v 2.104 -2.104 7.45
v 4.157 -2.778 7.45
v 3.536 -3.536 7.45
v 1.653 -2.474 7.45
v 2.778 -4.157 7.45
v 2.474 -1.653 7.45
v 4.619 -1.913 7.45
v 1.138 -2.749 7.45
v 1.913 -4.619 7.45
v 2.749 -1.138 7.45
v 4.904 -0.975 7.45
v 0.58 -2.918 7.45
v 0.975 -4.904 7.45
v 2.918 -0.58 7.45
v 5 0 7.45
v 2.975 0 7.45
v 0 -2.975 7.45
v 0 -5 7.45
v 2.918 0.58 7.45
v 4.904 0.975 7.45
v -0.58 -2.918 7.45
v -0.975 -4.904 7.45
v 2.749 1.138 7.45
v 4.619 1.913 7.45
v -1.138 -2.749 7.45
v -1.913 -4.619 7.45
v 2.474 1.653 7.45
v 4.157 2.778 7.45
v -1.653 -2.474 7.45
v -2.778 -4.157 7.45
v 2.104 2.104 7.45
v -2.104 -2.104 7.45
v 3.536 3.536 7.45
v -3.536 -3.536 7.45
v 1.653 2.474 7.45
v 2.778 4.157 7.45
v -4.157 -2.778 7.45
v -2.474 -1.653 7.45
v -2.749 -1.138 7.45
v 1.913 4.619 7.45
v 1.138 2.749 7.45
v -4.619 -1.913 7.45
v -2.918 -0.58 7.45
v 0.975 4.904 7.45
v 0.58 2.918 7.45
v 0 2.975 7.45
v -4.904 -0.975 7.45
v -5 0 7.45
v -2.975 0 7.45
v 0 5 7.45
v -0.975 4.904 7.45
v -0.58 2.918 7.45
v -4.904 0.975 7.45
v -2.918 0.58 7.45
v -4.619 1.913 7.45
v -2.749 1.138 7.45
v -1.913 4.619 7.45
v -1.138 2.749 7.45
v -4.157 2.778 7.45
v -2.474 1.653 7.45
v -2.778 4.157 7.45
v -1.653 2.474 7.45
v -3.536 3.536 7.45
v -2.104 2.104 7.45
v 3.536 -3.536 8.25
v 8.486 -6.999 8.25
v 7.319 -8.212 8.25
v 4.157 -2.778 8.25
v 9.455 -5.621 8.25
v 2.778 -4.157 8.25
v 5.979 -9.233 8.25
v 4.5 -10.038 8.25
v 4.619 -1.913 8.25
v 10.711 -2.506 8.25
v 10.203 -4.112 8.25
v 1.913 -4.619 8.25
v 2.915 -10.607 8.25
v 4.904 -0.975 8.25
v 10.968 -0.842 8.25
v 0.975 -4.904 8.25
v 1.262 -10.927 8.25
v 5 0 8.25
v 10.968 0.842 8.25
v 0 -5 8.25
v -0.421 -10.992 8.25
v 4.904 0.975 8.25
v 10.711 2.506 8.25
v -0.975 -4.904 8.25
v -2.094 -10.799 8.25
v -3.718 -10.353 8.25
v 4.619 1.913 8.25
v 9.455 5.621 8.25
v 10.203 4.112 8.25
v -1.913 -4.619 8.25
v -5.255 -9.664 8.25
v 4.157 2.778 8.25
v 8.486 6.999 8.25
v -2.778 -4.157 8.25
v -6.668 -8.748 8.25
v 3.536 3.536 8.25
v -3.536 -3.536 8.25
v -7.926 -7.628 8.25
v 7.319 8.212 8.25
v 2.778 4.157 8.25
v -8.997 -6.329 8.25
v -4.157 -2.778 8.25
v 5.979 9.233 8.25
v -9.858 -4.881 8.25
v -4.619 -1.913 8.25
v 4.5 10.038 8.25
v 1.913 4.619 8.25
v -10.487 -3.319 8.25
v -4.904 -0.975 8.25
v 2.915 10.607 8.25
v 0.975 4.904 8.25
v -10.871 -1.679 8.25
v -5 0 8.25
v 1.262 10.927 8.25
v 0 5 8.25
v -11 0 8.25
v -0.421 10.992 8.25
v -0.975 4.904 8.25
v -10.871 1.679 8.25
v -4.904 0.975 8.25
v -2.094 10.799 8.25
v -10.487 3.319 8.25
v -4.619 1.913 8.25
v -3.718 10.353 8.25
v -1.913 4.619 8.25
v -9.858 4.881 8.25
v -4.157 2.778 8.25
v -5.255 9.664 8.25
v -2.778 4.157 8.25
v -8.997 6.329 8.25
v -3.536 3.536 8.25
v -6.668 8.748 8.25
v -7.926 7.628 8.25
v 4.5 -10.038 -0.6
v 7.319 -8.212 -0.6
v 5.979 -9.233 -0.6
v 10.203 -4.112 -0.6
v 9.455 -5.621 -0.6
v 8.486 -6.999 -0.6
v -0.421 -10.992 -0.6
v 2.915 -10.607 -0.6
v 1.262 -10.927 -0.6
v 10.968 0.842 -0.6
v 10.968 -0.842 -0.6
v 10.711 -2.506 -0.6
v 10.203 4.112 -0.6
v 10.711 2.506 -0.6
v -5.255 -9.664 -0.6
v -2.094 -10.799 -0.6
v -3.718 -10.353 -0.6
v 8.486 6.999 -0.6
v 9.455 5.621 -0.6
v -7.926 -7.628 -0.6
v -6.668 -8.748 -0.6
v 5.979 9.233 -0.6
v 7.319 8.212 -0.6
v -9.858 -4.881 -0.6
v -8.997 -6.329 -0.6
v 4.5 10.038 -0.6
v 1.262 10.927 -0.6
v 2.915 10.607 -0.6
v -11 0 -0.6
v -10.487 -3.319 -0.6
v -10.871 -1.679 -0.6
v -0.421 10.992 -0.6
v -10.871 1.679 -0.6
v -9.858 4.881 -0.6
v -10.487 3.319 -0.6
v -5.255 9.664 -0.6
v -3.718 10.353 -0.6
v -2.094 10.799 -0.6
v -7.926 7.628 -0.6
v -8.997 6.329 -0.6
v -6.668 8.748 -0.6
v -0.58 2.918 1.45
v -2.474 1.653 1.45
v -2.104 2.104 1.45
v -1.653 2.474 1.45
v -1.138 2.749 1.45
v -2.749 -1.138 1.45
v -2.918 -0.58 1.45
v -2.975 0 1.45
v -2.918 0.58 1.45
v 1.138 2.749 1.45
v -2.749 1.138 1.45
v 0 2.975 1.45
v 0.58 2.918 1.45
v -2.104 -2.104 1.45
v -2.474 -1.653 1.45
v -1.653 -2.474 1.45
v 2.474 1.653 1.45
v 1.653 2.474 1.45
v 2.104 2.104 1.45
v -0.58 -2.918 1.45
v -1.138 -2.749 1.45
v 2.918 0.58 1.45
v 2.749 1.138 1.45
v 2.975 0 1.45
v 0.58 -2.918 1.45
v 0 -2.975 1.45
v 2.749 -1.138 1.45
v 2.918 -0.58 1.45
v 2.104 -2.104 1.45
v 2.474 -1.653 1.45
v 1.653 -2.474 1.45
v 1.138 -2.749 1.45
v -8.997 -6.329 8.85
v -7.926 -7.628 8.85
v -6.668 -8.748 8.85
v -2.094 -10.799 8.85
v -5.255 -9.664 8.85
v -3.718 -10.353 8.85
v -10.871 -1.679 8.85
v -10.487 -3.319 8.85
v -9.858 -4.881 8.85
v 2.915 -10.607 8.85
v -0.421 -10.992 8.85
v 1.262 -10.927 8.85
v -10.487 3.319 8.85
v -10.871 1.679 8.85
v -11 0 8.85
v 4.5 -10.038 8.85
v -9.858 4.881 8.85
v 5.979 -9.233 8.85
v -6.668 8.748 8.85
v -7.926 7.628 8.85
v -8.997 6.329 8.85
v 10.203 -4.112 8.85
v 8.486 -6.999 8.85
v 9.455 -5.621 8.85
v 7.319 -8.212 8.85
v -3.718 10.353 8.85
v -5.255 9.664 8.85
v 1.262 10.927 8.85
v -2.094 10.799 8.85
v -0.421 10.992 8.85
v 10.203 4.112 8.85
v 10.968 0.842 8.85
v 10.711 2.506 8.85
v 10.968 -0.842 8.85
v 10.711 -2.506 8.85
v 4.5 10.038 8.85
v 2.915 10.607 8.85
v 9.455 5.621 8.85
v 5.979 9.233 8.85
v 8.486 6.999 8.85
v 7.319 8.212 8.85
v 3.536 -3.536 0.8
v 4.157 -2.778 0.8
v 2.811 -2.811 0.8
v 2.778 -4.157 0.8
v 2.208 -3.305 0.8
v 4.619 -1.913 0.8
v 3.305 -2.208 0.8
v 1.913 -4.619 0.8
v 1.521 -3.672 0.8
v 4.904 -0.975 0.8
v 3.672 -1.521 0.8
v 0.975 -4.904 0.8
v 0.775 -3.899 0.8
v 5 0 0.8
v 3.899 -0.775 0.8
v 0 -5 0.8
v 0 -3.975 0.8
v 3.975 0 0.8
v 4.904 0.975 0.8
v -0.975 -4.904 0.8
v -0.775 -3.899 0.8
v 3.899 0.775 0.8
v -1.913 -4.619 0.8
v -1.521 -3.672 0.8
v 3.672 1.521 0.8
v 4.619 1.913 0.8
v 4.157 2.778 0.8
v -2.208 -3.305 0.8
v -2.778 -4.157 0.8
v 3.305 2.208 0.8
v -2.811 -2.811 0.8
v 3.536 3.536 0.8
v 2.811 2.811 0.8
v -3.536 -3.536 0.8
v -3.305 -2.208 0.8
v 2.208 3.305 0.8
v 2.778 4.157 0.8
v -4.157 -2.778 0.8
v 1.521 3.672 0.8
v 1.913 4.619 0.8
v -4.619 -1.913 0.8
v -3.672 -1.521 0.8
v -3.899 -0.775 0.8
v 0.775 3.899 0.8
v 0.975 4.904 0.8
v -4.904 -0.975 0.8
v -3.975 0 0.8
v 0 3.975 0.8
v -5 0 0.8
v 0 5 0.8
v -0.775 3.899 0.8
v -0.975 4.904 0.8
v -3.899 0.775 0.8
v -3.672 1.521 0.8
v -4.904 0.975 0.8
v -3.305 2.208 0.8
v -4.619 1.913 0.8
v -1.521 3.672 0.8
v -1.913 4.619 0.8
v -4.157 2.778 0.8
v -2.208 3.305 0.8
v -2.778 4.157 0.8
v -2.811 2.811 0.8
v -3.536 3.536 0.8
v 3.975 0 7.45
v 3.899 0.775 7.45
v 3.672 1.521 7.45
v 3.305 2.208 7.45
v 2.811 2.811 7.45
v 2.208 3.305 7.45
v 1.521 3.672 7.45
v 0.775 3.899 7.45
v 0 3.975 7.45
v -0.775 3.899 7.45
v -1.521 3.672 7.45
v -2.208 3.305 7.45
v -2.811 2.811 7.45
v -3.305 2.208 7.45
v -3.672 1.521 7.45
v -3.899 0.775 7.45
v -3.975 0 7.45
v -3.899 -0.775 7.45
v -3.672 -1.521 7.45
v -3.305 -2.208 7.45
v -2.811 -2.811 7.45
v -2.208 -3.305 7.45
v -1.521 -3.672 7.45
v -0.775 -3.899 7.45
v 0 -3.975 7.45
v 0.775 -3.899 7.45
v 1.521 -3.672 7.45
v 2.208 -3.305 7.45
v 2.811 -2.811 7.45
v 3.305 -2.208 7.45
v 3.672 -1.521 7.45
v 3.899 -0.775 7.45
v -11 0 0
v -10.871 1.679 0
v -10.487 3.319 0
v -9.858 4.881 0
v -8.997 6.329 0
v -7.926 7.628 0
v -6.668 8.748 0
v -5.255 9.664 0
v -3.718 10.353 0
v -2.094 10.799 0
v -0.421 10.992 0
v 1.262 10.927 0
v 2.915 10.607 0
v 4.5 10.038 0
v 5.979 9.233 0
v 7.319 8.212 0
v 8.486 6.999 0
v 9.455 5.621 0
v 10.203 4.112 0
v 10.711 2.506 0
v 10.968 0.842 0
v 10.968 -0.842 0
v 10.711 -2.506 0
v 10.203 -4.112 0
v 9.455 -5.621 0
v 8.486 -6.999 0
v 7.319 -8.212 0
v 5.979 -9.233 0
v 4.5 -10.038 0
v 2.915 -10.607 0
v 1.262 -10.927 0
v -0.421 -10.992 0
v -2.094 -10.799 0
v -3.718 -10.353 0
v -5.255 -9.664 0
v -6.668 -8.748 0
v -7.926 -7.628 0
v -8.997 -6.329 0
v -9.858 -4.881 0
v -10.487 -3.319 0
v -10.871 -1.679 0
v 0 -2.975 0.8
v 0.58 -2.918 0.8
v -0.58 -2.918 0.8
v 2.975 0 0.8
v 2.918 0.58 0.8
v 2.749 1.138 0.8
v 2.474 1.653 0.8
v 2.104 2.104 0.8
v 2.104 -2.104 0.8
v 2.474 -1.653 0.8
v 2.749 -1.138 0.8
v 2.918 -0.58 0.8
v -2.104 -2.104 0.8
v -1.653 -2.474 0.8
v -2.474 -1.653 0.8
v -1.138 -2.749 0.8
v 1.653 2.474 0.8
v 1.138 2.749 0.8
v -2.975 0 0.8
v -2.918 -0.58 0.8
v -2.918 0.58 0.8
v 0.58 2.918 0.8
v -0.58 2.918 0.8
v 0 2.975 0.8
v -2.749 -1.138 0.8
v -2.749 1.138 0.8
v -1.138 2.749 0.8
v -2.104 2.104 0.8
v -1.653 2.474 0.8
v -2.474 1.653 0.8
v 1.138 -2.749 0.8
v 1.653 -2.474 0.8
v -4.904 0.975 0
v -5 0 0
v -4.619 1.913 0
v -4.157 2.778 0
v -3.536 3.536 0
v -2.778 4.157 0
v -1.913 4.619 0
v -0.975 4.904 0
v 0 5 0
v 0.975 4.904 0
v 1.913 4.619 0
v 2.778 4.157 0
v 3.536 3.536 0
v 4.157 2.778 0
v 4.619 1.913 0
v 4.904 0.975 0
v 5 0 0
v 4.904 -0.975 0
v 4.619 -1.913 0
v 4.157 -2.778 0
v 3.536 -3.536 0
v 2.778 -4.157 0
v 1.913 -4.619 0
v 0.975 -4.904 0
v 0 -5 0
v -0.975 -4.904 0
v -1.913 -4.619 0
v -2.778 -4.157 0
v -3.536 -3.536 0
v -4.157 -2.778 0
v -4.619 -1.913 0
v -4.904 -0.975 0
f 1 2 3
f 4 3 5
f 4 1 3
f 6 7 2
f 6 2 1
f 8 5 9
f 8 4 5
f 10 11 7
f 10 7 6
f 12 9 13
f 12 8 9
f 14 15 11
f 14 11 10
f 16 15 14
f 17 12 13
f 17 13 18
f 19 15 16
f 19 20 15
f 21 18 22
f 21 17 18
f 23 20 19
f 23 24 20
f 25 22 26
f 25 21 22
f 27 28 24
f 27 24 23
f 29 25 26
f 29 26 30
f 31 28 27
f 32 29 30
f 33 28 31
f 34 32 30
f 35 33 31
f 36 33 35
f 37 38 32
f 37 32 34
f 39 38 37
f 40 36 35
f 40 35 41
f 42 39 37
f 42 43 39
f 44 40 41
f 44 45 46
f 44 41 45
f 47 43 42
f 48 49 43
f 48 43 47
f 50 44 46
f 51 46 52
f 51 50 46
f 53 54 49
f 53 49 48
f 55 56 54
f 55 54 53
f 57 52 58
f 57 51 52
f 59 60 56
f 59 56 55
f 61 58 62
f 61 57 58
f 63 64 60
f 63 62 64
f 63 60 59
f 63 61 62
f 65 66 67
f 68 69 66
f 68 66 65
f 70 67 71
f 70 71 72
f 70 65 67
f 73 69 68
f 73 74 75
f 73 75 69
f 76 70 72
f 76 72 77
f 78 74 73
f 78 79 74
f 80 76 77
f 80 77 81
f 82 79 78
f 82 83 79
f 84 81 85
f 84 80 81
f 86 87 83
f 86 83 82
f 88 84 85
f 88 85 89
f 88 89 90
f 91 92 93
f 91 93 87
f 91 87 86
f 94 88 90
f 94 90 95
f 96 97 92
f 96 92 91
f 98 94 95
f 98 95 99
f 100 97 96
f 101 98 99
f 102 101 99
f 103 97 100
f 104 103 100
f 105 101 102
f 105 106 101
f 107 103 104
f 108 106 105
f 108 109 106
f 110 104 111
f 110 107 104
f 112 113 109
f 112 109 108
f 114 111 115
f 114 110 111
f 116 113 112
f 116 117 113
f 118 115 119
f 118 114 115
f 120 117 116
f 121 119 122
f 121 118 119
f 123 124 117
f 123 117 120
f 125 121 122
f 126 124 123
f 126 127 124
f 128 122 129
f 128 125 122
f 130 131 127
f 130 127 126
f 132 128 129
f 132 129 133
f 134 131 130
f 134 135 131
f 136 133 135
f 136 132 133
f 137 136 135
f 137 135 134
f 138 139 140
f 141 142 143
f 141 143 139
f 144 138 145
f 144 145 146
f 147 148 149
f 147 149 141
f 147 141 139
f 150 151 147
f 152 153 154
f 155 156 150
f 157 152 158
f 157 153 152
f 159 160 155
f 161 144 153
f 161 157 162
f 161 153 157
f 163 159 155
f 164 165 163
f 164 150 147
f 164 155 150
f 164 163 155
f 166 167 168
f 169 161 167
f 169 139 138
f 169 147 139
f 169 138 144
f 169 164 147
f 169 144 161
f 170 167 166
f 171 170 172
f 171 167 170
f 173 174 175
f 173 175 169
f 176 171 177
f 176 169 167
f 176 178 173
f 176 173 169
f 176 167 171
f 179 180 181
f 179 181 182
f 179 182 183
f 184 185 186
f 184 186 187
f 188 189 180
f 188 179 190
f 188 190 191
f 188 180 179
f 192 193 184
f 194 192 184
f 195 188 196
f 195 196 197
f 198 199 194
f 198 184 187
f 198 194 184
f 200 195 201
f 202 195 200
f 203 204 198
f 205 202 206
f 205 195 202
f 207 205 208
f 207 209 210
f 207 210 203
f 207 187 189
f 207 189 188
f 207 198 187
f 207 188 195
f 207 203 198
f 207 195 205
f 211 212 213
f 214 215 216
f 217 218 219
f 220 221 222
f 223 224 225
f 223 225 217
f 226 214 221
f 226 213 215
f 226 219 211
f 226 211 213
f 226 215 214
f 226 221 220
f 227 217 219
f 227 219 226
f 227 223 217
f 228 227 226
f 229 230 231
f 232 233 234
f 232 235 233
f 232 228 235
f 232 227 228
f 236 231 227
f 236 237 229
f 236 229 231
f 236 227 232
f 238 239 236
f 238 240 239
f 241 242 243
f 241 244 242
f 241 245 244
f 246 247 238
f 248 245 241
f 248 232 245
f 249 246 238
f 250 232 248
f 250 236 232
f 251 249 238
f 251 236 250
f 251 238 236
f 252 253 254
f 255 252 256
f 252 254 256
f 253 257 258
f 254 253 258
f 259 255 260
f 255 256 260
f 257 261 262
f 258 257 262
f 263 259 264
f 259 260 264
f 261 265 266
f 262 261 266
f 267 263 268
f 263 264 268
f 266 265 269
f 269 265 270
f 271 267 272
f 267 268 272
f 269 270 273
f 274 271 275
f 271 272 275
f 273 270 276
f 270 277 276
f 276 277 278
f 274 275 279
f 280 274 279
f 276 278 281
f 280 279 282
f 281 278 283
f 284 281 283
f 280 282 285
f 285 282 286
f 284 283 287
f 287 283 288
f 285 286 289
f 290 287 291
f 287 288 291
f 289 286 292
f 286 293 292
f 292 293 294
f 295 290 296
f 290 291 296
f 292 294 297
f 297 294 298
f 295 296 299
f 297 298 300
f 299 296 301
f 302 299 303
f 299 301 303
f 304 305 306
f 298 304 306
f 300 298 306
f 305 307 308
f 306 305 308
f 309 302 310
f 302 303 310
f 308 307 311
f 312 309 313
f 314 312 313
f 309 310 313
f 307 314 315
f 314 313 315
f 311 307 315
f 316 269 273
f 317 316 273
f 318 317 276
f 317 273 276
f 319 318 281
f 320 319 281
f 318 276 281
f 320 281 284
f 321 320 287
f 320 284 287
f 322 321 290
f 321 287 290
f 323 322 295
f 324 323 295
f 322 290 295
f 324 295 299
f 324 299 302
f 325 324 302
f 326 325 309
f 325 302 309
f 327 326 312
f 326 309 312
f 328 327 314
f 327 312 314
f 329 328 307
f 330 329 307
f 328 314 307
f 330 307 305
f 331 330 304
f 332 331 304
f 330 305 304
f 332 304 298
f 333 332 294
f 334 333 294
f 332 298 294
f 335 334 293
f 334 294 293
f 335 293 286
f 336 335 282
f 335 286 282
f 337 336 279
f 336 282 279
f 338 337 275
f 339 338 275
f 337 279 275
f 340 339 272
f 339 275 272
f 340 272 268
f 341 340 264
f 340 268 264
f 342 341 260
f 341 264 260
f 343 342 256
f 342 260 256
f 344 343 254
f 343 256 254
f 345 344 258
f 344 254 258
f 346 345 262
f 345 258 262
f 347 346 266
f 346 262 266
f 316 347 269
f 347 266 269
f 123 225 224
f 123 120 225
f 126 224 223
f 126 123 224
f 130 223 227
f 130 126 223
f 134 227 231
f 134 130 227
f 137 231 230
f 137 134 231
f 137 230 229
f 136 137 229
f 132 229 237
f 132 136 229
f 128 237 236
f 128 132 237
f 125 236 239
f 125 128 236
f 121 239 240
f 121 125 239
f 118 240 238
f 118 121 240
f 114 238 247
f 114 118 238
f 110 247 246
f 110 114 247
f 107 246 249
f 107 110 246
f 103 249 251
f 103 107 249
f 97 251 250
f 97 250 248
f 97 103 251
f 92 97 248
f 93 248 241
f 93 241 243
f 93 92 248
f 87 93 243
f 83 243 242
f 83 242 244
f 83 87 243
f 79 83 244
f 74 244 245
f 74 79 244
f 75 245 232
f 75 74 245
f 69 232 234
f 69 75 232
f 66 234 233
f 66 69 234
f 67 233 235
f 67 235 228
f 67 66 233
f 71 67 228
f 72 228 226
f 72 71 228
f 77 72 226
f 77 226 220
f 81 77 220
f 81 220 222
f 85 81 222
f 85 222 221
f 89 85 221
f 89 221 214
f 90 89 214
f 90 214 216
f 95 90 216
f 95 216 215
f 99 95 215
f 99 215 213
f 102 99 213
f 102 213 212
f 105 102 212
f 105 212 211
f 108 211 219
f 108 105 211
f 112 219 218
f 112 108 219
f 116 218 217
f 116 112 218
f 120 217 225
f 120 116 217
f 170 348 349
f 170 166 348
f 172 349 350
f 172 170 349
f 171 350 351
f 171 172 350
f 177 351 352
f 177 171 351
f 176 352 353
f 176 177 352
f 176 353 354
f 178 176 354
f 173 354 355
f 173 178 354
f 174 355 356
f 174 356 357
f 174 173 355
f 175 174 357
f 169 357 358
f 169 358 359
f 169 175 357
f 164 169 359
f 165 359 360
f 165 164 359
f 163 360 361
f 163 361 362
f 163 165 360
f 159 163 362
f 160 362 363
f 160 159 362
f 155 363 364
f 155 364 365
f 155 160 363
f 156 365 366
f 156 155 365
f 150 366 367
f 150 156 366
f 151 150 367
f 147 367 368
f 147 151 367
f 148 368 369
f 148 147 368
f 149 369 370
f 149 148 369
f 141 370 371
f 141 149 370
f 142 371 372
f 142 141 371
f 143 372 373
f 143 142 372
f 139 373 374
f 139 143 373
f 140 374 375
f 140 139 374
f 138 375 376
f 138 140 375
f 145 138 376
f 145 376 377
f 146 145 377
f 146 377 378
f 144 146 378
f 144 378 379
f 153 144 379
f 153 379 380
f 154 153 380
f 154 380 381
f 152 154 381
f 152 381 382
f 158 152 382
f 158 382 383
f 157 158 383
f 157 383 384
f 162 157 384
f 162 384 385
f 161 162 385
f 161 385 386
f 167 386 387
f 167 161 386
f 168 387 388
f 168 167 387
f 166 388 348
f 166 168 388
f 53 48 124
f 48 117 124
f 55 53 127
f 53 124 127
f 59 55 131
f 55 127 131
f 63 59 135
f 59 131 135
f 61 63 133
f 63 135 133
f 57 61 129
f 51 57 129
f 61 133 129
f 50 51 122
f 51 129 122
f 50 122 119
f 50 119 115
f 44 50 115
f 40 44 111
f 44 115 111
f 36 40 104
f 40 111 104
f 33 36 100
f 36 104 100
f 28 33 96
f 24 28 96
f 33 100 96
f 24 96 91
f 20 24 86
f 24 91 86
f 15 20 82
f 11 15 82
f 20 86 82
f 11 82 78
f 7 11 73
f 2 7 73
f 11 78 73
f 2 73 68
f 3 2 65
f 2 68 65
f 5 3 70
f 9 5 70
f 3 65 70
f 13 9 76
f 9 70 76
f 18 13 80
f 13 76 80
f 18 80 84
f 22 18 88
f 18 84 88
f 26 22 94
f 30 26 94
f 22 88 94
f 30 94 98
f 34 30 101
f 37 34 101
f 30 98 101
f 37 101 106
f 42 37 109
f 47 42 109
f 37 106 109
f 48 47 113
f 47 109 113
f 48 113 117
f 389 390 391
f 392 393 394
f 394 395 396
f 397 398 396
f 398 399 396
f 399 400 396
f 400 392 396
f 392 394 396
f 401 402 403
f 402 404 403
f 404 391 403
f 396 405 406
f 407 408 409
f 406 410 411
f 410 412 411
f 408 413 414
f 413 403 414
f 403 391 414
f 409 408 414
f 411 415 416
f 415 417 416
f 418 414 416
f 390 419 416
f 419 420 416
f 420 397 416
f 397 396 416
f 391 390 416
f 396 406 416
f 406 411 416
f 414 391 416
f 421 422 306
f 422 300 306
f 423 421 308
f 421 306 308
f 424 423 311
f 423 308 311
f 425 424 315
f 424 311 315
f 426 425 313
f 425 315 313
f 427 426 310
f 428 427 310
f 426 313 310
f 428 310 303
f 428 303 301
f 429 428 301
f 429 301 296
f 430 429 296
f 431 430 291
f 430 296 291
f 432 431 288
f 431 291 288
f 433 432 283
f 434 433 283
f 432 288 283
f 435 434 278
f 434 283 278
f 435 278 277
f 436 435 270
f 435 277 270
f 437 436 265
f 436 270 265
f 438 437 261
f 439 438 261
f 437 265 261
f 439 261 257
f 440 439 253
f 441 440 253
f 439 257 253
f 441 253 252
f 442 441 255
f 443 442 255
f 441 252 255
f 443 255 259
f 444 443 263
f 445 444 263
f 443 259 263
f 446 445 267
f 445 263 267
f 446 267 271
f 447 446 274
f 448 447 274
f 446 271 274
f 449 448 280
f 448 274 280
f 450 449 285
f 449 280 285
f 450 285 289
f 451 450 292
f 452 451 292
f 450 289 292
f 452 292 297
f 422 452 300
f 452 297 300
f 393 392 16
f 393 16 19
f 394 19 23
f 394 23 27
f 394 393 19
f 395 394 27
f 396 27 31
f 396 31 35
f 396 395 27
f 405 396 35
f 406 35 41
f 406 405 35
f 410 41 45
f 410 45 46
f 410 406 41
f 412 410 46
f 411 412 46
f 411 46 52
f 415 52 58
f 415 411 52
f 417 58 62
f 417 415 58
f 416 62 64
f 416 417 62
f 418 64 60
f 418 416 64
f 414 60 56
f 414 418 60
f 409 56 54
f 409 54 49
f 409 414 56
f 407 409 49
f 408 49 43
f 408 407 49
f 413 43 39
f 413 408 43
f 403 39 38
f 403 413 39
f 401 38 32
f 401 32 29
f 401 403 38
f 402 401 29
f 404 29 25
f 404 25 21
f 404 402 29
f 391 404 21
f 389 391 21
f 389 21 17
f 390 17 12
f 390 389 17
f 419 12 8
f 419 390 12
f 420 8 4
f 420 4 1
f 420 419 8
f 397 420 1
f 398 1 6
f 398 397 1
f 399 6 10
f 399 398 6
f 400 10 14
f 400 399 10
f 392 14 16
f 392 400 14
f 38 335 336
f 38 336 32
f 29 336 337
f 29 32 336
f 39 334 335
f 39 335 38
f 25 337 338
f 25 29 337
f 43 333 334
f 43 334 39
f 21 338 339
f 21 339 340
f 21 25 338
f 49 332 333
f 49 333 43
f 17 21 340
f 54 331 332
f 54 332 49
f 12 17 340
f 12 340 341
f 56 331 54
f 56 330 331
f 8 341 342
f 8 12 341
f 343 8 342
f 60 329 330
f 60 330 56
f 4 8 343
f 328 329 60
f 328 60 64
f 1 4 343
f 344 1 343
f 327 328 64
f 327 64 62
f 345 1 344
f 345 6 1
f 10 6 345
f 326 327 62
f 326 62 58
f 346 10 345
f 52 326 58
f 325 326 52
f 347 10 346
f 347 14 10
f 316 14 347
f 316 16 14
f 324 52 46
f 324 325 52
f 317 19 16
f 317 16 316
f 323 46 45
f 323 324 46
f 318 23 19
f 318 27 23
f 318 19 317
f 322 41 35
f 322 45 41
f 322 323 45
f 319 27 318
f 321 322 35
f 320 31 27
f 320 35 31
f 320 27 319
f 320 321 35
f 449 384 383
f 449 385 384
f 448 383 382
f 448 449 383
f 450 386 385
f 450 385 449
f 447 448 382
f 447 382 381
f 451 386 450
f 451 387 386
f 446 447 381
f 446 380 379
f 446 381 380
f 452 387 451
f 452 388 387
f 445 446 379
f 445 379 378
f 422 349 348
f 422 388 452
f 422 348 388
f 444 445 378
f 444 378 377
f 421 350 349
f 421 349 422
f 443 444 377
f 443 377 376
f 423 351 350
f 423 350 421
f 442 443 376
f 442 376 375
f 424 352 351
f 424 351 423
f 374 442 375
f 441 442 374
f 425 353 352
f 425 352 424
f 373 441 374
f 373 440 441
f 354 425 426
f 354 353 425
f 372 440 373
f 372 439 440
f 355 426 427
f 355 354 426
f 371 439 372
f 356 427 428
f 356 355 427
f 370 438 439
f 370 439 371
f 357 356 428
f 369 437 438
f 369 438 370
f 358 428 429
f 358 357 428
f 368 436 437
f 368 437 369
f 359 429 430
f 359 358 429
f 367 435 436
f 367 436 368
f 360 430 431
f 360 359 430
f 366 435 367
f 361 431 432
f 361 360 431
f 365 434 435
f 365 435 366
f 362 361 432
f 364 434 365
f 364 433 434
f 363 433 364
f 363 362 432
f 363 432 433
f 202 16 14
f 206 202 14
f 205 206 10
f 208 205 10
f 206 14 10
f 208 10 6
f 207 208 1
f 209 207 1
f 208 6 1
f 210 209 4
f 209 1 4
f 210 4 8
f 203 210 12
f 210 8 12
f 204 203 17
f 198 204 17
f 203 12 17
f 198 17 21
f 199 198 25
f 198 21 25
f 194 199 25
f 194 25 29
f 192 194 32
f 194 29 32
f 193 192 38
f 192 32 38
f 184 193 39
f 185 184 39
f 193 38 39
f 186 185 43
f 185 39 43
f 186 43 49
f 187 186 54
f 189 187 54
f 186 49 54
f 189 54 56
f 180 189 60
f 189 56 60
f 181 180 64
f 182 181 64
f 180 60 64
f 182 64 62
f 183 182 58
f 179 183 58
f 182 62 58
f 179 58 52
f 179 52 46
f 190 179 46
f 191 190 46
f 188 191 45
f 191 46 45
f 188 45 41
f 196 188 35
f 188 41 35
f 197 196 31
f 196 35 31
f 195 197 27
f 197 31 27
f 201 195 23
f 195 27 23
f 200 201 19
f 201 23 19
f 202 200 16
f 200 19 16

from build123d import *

# Parameters (mm, degrees)
F0_W     = 5
F0_H     = 0.8
F2_R     = 3.975
F2_R_2   = 2.975
F3_DEPTH = 6.65
F5_R     = 2.975
F6_DEPTH = 6


# Not quite as in the source:
# - a feature names something its author has since deleted; it is built from what else it names


with BuildPart() as f1:
    # F0 (on Front) → F1 (revolve)
    with BuildSketch(Plane.XZ):
        with Locations((-2.5, 0.4)):
            Rectangle(F0_W, F0_H)
        Polygon((0, -0.6), (0, 0), (-5, 0), (-11, 0), (-11, -0.6), (-10.4, -0.6), align=None)
    revolve(axis=Axis((0, 0, 3.9109135978), (0, 0, -1)))

    # F2 (on face) → F3 (join)
    with BuildSketch(Plane.XY.offset(0.8)):
        Circle(F2_R)
        Circle(F2_R_2, mode=Mode.SUBTRACT)
    extrude(amount=F3_DEPTH)


with BuildPart() as f4:
    # F0 (on Front) → F4 (revolve)
    with BuildSketch(Plane.XZ):
        Polygon((-11, 8.85), (-11, 8.25), (-5, 8.25), (0, 8.25), (0, 8.85), (-10.4, 8.85), align=None)
        with Locations((-2.5, 7.85)):
            Rectangle(F0_W, F0_H)
    revolve(axis=Axis((0, 0, 3.9109135978), (0, 0, -1)))

    # F5 (on face) → F6 (join)
    with BuildSketch(Plane(origin=(0, 0, 7.45), x_dir=(1, 0, 0), z_dir=(0, 0, -1))):
        Circle(F5_R)
    extrude(amount=F6_DEPTH)


solid = Compound([f1.part, f4.part])
